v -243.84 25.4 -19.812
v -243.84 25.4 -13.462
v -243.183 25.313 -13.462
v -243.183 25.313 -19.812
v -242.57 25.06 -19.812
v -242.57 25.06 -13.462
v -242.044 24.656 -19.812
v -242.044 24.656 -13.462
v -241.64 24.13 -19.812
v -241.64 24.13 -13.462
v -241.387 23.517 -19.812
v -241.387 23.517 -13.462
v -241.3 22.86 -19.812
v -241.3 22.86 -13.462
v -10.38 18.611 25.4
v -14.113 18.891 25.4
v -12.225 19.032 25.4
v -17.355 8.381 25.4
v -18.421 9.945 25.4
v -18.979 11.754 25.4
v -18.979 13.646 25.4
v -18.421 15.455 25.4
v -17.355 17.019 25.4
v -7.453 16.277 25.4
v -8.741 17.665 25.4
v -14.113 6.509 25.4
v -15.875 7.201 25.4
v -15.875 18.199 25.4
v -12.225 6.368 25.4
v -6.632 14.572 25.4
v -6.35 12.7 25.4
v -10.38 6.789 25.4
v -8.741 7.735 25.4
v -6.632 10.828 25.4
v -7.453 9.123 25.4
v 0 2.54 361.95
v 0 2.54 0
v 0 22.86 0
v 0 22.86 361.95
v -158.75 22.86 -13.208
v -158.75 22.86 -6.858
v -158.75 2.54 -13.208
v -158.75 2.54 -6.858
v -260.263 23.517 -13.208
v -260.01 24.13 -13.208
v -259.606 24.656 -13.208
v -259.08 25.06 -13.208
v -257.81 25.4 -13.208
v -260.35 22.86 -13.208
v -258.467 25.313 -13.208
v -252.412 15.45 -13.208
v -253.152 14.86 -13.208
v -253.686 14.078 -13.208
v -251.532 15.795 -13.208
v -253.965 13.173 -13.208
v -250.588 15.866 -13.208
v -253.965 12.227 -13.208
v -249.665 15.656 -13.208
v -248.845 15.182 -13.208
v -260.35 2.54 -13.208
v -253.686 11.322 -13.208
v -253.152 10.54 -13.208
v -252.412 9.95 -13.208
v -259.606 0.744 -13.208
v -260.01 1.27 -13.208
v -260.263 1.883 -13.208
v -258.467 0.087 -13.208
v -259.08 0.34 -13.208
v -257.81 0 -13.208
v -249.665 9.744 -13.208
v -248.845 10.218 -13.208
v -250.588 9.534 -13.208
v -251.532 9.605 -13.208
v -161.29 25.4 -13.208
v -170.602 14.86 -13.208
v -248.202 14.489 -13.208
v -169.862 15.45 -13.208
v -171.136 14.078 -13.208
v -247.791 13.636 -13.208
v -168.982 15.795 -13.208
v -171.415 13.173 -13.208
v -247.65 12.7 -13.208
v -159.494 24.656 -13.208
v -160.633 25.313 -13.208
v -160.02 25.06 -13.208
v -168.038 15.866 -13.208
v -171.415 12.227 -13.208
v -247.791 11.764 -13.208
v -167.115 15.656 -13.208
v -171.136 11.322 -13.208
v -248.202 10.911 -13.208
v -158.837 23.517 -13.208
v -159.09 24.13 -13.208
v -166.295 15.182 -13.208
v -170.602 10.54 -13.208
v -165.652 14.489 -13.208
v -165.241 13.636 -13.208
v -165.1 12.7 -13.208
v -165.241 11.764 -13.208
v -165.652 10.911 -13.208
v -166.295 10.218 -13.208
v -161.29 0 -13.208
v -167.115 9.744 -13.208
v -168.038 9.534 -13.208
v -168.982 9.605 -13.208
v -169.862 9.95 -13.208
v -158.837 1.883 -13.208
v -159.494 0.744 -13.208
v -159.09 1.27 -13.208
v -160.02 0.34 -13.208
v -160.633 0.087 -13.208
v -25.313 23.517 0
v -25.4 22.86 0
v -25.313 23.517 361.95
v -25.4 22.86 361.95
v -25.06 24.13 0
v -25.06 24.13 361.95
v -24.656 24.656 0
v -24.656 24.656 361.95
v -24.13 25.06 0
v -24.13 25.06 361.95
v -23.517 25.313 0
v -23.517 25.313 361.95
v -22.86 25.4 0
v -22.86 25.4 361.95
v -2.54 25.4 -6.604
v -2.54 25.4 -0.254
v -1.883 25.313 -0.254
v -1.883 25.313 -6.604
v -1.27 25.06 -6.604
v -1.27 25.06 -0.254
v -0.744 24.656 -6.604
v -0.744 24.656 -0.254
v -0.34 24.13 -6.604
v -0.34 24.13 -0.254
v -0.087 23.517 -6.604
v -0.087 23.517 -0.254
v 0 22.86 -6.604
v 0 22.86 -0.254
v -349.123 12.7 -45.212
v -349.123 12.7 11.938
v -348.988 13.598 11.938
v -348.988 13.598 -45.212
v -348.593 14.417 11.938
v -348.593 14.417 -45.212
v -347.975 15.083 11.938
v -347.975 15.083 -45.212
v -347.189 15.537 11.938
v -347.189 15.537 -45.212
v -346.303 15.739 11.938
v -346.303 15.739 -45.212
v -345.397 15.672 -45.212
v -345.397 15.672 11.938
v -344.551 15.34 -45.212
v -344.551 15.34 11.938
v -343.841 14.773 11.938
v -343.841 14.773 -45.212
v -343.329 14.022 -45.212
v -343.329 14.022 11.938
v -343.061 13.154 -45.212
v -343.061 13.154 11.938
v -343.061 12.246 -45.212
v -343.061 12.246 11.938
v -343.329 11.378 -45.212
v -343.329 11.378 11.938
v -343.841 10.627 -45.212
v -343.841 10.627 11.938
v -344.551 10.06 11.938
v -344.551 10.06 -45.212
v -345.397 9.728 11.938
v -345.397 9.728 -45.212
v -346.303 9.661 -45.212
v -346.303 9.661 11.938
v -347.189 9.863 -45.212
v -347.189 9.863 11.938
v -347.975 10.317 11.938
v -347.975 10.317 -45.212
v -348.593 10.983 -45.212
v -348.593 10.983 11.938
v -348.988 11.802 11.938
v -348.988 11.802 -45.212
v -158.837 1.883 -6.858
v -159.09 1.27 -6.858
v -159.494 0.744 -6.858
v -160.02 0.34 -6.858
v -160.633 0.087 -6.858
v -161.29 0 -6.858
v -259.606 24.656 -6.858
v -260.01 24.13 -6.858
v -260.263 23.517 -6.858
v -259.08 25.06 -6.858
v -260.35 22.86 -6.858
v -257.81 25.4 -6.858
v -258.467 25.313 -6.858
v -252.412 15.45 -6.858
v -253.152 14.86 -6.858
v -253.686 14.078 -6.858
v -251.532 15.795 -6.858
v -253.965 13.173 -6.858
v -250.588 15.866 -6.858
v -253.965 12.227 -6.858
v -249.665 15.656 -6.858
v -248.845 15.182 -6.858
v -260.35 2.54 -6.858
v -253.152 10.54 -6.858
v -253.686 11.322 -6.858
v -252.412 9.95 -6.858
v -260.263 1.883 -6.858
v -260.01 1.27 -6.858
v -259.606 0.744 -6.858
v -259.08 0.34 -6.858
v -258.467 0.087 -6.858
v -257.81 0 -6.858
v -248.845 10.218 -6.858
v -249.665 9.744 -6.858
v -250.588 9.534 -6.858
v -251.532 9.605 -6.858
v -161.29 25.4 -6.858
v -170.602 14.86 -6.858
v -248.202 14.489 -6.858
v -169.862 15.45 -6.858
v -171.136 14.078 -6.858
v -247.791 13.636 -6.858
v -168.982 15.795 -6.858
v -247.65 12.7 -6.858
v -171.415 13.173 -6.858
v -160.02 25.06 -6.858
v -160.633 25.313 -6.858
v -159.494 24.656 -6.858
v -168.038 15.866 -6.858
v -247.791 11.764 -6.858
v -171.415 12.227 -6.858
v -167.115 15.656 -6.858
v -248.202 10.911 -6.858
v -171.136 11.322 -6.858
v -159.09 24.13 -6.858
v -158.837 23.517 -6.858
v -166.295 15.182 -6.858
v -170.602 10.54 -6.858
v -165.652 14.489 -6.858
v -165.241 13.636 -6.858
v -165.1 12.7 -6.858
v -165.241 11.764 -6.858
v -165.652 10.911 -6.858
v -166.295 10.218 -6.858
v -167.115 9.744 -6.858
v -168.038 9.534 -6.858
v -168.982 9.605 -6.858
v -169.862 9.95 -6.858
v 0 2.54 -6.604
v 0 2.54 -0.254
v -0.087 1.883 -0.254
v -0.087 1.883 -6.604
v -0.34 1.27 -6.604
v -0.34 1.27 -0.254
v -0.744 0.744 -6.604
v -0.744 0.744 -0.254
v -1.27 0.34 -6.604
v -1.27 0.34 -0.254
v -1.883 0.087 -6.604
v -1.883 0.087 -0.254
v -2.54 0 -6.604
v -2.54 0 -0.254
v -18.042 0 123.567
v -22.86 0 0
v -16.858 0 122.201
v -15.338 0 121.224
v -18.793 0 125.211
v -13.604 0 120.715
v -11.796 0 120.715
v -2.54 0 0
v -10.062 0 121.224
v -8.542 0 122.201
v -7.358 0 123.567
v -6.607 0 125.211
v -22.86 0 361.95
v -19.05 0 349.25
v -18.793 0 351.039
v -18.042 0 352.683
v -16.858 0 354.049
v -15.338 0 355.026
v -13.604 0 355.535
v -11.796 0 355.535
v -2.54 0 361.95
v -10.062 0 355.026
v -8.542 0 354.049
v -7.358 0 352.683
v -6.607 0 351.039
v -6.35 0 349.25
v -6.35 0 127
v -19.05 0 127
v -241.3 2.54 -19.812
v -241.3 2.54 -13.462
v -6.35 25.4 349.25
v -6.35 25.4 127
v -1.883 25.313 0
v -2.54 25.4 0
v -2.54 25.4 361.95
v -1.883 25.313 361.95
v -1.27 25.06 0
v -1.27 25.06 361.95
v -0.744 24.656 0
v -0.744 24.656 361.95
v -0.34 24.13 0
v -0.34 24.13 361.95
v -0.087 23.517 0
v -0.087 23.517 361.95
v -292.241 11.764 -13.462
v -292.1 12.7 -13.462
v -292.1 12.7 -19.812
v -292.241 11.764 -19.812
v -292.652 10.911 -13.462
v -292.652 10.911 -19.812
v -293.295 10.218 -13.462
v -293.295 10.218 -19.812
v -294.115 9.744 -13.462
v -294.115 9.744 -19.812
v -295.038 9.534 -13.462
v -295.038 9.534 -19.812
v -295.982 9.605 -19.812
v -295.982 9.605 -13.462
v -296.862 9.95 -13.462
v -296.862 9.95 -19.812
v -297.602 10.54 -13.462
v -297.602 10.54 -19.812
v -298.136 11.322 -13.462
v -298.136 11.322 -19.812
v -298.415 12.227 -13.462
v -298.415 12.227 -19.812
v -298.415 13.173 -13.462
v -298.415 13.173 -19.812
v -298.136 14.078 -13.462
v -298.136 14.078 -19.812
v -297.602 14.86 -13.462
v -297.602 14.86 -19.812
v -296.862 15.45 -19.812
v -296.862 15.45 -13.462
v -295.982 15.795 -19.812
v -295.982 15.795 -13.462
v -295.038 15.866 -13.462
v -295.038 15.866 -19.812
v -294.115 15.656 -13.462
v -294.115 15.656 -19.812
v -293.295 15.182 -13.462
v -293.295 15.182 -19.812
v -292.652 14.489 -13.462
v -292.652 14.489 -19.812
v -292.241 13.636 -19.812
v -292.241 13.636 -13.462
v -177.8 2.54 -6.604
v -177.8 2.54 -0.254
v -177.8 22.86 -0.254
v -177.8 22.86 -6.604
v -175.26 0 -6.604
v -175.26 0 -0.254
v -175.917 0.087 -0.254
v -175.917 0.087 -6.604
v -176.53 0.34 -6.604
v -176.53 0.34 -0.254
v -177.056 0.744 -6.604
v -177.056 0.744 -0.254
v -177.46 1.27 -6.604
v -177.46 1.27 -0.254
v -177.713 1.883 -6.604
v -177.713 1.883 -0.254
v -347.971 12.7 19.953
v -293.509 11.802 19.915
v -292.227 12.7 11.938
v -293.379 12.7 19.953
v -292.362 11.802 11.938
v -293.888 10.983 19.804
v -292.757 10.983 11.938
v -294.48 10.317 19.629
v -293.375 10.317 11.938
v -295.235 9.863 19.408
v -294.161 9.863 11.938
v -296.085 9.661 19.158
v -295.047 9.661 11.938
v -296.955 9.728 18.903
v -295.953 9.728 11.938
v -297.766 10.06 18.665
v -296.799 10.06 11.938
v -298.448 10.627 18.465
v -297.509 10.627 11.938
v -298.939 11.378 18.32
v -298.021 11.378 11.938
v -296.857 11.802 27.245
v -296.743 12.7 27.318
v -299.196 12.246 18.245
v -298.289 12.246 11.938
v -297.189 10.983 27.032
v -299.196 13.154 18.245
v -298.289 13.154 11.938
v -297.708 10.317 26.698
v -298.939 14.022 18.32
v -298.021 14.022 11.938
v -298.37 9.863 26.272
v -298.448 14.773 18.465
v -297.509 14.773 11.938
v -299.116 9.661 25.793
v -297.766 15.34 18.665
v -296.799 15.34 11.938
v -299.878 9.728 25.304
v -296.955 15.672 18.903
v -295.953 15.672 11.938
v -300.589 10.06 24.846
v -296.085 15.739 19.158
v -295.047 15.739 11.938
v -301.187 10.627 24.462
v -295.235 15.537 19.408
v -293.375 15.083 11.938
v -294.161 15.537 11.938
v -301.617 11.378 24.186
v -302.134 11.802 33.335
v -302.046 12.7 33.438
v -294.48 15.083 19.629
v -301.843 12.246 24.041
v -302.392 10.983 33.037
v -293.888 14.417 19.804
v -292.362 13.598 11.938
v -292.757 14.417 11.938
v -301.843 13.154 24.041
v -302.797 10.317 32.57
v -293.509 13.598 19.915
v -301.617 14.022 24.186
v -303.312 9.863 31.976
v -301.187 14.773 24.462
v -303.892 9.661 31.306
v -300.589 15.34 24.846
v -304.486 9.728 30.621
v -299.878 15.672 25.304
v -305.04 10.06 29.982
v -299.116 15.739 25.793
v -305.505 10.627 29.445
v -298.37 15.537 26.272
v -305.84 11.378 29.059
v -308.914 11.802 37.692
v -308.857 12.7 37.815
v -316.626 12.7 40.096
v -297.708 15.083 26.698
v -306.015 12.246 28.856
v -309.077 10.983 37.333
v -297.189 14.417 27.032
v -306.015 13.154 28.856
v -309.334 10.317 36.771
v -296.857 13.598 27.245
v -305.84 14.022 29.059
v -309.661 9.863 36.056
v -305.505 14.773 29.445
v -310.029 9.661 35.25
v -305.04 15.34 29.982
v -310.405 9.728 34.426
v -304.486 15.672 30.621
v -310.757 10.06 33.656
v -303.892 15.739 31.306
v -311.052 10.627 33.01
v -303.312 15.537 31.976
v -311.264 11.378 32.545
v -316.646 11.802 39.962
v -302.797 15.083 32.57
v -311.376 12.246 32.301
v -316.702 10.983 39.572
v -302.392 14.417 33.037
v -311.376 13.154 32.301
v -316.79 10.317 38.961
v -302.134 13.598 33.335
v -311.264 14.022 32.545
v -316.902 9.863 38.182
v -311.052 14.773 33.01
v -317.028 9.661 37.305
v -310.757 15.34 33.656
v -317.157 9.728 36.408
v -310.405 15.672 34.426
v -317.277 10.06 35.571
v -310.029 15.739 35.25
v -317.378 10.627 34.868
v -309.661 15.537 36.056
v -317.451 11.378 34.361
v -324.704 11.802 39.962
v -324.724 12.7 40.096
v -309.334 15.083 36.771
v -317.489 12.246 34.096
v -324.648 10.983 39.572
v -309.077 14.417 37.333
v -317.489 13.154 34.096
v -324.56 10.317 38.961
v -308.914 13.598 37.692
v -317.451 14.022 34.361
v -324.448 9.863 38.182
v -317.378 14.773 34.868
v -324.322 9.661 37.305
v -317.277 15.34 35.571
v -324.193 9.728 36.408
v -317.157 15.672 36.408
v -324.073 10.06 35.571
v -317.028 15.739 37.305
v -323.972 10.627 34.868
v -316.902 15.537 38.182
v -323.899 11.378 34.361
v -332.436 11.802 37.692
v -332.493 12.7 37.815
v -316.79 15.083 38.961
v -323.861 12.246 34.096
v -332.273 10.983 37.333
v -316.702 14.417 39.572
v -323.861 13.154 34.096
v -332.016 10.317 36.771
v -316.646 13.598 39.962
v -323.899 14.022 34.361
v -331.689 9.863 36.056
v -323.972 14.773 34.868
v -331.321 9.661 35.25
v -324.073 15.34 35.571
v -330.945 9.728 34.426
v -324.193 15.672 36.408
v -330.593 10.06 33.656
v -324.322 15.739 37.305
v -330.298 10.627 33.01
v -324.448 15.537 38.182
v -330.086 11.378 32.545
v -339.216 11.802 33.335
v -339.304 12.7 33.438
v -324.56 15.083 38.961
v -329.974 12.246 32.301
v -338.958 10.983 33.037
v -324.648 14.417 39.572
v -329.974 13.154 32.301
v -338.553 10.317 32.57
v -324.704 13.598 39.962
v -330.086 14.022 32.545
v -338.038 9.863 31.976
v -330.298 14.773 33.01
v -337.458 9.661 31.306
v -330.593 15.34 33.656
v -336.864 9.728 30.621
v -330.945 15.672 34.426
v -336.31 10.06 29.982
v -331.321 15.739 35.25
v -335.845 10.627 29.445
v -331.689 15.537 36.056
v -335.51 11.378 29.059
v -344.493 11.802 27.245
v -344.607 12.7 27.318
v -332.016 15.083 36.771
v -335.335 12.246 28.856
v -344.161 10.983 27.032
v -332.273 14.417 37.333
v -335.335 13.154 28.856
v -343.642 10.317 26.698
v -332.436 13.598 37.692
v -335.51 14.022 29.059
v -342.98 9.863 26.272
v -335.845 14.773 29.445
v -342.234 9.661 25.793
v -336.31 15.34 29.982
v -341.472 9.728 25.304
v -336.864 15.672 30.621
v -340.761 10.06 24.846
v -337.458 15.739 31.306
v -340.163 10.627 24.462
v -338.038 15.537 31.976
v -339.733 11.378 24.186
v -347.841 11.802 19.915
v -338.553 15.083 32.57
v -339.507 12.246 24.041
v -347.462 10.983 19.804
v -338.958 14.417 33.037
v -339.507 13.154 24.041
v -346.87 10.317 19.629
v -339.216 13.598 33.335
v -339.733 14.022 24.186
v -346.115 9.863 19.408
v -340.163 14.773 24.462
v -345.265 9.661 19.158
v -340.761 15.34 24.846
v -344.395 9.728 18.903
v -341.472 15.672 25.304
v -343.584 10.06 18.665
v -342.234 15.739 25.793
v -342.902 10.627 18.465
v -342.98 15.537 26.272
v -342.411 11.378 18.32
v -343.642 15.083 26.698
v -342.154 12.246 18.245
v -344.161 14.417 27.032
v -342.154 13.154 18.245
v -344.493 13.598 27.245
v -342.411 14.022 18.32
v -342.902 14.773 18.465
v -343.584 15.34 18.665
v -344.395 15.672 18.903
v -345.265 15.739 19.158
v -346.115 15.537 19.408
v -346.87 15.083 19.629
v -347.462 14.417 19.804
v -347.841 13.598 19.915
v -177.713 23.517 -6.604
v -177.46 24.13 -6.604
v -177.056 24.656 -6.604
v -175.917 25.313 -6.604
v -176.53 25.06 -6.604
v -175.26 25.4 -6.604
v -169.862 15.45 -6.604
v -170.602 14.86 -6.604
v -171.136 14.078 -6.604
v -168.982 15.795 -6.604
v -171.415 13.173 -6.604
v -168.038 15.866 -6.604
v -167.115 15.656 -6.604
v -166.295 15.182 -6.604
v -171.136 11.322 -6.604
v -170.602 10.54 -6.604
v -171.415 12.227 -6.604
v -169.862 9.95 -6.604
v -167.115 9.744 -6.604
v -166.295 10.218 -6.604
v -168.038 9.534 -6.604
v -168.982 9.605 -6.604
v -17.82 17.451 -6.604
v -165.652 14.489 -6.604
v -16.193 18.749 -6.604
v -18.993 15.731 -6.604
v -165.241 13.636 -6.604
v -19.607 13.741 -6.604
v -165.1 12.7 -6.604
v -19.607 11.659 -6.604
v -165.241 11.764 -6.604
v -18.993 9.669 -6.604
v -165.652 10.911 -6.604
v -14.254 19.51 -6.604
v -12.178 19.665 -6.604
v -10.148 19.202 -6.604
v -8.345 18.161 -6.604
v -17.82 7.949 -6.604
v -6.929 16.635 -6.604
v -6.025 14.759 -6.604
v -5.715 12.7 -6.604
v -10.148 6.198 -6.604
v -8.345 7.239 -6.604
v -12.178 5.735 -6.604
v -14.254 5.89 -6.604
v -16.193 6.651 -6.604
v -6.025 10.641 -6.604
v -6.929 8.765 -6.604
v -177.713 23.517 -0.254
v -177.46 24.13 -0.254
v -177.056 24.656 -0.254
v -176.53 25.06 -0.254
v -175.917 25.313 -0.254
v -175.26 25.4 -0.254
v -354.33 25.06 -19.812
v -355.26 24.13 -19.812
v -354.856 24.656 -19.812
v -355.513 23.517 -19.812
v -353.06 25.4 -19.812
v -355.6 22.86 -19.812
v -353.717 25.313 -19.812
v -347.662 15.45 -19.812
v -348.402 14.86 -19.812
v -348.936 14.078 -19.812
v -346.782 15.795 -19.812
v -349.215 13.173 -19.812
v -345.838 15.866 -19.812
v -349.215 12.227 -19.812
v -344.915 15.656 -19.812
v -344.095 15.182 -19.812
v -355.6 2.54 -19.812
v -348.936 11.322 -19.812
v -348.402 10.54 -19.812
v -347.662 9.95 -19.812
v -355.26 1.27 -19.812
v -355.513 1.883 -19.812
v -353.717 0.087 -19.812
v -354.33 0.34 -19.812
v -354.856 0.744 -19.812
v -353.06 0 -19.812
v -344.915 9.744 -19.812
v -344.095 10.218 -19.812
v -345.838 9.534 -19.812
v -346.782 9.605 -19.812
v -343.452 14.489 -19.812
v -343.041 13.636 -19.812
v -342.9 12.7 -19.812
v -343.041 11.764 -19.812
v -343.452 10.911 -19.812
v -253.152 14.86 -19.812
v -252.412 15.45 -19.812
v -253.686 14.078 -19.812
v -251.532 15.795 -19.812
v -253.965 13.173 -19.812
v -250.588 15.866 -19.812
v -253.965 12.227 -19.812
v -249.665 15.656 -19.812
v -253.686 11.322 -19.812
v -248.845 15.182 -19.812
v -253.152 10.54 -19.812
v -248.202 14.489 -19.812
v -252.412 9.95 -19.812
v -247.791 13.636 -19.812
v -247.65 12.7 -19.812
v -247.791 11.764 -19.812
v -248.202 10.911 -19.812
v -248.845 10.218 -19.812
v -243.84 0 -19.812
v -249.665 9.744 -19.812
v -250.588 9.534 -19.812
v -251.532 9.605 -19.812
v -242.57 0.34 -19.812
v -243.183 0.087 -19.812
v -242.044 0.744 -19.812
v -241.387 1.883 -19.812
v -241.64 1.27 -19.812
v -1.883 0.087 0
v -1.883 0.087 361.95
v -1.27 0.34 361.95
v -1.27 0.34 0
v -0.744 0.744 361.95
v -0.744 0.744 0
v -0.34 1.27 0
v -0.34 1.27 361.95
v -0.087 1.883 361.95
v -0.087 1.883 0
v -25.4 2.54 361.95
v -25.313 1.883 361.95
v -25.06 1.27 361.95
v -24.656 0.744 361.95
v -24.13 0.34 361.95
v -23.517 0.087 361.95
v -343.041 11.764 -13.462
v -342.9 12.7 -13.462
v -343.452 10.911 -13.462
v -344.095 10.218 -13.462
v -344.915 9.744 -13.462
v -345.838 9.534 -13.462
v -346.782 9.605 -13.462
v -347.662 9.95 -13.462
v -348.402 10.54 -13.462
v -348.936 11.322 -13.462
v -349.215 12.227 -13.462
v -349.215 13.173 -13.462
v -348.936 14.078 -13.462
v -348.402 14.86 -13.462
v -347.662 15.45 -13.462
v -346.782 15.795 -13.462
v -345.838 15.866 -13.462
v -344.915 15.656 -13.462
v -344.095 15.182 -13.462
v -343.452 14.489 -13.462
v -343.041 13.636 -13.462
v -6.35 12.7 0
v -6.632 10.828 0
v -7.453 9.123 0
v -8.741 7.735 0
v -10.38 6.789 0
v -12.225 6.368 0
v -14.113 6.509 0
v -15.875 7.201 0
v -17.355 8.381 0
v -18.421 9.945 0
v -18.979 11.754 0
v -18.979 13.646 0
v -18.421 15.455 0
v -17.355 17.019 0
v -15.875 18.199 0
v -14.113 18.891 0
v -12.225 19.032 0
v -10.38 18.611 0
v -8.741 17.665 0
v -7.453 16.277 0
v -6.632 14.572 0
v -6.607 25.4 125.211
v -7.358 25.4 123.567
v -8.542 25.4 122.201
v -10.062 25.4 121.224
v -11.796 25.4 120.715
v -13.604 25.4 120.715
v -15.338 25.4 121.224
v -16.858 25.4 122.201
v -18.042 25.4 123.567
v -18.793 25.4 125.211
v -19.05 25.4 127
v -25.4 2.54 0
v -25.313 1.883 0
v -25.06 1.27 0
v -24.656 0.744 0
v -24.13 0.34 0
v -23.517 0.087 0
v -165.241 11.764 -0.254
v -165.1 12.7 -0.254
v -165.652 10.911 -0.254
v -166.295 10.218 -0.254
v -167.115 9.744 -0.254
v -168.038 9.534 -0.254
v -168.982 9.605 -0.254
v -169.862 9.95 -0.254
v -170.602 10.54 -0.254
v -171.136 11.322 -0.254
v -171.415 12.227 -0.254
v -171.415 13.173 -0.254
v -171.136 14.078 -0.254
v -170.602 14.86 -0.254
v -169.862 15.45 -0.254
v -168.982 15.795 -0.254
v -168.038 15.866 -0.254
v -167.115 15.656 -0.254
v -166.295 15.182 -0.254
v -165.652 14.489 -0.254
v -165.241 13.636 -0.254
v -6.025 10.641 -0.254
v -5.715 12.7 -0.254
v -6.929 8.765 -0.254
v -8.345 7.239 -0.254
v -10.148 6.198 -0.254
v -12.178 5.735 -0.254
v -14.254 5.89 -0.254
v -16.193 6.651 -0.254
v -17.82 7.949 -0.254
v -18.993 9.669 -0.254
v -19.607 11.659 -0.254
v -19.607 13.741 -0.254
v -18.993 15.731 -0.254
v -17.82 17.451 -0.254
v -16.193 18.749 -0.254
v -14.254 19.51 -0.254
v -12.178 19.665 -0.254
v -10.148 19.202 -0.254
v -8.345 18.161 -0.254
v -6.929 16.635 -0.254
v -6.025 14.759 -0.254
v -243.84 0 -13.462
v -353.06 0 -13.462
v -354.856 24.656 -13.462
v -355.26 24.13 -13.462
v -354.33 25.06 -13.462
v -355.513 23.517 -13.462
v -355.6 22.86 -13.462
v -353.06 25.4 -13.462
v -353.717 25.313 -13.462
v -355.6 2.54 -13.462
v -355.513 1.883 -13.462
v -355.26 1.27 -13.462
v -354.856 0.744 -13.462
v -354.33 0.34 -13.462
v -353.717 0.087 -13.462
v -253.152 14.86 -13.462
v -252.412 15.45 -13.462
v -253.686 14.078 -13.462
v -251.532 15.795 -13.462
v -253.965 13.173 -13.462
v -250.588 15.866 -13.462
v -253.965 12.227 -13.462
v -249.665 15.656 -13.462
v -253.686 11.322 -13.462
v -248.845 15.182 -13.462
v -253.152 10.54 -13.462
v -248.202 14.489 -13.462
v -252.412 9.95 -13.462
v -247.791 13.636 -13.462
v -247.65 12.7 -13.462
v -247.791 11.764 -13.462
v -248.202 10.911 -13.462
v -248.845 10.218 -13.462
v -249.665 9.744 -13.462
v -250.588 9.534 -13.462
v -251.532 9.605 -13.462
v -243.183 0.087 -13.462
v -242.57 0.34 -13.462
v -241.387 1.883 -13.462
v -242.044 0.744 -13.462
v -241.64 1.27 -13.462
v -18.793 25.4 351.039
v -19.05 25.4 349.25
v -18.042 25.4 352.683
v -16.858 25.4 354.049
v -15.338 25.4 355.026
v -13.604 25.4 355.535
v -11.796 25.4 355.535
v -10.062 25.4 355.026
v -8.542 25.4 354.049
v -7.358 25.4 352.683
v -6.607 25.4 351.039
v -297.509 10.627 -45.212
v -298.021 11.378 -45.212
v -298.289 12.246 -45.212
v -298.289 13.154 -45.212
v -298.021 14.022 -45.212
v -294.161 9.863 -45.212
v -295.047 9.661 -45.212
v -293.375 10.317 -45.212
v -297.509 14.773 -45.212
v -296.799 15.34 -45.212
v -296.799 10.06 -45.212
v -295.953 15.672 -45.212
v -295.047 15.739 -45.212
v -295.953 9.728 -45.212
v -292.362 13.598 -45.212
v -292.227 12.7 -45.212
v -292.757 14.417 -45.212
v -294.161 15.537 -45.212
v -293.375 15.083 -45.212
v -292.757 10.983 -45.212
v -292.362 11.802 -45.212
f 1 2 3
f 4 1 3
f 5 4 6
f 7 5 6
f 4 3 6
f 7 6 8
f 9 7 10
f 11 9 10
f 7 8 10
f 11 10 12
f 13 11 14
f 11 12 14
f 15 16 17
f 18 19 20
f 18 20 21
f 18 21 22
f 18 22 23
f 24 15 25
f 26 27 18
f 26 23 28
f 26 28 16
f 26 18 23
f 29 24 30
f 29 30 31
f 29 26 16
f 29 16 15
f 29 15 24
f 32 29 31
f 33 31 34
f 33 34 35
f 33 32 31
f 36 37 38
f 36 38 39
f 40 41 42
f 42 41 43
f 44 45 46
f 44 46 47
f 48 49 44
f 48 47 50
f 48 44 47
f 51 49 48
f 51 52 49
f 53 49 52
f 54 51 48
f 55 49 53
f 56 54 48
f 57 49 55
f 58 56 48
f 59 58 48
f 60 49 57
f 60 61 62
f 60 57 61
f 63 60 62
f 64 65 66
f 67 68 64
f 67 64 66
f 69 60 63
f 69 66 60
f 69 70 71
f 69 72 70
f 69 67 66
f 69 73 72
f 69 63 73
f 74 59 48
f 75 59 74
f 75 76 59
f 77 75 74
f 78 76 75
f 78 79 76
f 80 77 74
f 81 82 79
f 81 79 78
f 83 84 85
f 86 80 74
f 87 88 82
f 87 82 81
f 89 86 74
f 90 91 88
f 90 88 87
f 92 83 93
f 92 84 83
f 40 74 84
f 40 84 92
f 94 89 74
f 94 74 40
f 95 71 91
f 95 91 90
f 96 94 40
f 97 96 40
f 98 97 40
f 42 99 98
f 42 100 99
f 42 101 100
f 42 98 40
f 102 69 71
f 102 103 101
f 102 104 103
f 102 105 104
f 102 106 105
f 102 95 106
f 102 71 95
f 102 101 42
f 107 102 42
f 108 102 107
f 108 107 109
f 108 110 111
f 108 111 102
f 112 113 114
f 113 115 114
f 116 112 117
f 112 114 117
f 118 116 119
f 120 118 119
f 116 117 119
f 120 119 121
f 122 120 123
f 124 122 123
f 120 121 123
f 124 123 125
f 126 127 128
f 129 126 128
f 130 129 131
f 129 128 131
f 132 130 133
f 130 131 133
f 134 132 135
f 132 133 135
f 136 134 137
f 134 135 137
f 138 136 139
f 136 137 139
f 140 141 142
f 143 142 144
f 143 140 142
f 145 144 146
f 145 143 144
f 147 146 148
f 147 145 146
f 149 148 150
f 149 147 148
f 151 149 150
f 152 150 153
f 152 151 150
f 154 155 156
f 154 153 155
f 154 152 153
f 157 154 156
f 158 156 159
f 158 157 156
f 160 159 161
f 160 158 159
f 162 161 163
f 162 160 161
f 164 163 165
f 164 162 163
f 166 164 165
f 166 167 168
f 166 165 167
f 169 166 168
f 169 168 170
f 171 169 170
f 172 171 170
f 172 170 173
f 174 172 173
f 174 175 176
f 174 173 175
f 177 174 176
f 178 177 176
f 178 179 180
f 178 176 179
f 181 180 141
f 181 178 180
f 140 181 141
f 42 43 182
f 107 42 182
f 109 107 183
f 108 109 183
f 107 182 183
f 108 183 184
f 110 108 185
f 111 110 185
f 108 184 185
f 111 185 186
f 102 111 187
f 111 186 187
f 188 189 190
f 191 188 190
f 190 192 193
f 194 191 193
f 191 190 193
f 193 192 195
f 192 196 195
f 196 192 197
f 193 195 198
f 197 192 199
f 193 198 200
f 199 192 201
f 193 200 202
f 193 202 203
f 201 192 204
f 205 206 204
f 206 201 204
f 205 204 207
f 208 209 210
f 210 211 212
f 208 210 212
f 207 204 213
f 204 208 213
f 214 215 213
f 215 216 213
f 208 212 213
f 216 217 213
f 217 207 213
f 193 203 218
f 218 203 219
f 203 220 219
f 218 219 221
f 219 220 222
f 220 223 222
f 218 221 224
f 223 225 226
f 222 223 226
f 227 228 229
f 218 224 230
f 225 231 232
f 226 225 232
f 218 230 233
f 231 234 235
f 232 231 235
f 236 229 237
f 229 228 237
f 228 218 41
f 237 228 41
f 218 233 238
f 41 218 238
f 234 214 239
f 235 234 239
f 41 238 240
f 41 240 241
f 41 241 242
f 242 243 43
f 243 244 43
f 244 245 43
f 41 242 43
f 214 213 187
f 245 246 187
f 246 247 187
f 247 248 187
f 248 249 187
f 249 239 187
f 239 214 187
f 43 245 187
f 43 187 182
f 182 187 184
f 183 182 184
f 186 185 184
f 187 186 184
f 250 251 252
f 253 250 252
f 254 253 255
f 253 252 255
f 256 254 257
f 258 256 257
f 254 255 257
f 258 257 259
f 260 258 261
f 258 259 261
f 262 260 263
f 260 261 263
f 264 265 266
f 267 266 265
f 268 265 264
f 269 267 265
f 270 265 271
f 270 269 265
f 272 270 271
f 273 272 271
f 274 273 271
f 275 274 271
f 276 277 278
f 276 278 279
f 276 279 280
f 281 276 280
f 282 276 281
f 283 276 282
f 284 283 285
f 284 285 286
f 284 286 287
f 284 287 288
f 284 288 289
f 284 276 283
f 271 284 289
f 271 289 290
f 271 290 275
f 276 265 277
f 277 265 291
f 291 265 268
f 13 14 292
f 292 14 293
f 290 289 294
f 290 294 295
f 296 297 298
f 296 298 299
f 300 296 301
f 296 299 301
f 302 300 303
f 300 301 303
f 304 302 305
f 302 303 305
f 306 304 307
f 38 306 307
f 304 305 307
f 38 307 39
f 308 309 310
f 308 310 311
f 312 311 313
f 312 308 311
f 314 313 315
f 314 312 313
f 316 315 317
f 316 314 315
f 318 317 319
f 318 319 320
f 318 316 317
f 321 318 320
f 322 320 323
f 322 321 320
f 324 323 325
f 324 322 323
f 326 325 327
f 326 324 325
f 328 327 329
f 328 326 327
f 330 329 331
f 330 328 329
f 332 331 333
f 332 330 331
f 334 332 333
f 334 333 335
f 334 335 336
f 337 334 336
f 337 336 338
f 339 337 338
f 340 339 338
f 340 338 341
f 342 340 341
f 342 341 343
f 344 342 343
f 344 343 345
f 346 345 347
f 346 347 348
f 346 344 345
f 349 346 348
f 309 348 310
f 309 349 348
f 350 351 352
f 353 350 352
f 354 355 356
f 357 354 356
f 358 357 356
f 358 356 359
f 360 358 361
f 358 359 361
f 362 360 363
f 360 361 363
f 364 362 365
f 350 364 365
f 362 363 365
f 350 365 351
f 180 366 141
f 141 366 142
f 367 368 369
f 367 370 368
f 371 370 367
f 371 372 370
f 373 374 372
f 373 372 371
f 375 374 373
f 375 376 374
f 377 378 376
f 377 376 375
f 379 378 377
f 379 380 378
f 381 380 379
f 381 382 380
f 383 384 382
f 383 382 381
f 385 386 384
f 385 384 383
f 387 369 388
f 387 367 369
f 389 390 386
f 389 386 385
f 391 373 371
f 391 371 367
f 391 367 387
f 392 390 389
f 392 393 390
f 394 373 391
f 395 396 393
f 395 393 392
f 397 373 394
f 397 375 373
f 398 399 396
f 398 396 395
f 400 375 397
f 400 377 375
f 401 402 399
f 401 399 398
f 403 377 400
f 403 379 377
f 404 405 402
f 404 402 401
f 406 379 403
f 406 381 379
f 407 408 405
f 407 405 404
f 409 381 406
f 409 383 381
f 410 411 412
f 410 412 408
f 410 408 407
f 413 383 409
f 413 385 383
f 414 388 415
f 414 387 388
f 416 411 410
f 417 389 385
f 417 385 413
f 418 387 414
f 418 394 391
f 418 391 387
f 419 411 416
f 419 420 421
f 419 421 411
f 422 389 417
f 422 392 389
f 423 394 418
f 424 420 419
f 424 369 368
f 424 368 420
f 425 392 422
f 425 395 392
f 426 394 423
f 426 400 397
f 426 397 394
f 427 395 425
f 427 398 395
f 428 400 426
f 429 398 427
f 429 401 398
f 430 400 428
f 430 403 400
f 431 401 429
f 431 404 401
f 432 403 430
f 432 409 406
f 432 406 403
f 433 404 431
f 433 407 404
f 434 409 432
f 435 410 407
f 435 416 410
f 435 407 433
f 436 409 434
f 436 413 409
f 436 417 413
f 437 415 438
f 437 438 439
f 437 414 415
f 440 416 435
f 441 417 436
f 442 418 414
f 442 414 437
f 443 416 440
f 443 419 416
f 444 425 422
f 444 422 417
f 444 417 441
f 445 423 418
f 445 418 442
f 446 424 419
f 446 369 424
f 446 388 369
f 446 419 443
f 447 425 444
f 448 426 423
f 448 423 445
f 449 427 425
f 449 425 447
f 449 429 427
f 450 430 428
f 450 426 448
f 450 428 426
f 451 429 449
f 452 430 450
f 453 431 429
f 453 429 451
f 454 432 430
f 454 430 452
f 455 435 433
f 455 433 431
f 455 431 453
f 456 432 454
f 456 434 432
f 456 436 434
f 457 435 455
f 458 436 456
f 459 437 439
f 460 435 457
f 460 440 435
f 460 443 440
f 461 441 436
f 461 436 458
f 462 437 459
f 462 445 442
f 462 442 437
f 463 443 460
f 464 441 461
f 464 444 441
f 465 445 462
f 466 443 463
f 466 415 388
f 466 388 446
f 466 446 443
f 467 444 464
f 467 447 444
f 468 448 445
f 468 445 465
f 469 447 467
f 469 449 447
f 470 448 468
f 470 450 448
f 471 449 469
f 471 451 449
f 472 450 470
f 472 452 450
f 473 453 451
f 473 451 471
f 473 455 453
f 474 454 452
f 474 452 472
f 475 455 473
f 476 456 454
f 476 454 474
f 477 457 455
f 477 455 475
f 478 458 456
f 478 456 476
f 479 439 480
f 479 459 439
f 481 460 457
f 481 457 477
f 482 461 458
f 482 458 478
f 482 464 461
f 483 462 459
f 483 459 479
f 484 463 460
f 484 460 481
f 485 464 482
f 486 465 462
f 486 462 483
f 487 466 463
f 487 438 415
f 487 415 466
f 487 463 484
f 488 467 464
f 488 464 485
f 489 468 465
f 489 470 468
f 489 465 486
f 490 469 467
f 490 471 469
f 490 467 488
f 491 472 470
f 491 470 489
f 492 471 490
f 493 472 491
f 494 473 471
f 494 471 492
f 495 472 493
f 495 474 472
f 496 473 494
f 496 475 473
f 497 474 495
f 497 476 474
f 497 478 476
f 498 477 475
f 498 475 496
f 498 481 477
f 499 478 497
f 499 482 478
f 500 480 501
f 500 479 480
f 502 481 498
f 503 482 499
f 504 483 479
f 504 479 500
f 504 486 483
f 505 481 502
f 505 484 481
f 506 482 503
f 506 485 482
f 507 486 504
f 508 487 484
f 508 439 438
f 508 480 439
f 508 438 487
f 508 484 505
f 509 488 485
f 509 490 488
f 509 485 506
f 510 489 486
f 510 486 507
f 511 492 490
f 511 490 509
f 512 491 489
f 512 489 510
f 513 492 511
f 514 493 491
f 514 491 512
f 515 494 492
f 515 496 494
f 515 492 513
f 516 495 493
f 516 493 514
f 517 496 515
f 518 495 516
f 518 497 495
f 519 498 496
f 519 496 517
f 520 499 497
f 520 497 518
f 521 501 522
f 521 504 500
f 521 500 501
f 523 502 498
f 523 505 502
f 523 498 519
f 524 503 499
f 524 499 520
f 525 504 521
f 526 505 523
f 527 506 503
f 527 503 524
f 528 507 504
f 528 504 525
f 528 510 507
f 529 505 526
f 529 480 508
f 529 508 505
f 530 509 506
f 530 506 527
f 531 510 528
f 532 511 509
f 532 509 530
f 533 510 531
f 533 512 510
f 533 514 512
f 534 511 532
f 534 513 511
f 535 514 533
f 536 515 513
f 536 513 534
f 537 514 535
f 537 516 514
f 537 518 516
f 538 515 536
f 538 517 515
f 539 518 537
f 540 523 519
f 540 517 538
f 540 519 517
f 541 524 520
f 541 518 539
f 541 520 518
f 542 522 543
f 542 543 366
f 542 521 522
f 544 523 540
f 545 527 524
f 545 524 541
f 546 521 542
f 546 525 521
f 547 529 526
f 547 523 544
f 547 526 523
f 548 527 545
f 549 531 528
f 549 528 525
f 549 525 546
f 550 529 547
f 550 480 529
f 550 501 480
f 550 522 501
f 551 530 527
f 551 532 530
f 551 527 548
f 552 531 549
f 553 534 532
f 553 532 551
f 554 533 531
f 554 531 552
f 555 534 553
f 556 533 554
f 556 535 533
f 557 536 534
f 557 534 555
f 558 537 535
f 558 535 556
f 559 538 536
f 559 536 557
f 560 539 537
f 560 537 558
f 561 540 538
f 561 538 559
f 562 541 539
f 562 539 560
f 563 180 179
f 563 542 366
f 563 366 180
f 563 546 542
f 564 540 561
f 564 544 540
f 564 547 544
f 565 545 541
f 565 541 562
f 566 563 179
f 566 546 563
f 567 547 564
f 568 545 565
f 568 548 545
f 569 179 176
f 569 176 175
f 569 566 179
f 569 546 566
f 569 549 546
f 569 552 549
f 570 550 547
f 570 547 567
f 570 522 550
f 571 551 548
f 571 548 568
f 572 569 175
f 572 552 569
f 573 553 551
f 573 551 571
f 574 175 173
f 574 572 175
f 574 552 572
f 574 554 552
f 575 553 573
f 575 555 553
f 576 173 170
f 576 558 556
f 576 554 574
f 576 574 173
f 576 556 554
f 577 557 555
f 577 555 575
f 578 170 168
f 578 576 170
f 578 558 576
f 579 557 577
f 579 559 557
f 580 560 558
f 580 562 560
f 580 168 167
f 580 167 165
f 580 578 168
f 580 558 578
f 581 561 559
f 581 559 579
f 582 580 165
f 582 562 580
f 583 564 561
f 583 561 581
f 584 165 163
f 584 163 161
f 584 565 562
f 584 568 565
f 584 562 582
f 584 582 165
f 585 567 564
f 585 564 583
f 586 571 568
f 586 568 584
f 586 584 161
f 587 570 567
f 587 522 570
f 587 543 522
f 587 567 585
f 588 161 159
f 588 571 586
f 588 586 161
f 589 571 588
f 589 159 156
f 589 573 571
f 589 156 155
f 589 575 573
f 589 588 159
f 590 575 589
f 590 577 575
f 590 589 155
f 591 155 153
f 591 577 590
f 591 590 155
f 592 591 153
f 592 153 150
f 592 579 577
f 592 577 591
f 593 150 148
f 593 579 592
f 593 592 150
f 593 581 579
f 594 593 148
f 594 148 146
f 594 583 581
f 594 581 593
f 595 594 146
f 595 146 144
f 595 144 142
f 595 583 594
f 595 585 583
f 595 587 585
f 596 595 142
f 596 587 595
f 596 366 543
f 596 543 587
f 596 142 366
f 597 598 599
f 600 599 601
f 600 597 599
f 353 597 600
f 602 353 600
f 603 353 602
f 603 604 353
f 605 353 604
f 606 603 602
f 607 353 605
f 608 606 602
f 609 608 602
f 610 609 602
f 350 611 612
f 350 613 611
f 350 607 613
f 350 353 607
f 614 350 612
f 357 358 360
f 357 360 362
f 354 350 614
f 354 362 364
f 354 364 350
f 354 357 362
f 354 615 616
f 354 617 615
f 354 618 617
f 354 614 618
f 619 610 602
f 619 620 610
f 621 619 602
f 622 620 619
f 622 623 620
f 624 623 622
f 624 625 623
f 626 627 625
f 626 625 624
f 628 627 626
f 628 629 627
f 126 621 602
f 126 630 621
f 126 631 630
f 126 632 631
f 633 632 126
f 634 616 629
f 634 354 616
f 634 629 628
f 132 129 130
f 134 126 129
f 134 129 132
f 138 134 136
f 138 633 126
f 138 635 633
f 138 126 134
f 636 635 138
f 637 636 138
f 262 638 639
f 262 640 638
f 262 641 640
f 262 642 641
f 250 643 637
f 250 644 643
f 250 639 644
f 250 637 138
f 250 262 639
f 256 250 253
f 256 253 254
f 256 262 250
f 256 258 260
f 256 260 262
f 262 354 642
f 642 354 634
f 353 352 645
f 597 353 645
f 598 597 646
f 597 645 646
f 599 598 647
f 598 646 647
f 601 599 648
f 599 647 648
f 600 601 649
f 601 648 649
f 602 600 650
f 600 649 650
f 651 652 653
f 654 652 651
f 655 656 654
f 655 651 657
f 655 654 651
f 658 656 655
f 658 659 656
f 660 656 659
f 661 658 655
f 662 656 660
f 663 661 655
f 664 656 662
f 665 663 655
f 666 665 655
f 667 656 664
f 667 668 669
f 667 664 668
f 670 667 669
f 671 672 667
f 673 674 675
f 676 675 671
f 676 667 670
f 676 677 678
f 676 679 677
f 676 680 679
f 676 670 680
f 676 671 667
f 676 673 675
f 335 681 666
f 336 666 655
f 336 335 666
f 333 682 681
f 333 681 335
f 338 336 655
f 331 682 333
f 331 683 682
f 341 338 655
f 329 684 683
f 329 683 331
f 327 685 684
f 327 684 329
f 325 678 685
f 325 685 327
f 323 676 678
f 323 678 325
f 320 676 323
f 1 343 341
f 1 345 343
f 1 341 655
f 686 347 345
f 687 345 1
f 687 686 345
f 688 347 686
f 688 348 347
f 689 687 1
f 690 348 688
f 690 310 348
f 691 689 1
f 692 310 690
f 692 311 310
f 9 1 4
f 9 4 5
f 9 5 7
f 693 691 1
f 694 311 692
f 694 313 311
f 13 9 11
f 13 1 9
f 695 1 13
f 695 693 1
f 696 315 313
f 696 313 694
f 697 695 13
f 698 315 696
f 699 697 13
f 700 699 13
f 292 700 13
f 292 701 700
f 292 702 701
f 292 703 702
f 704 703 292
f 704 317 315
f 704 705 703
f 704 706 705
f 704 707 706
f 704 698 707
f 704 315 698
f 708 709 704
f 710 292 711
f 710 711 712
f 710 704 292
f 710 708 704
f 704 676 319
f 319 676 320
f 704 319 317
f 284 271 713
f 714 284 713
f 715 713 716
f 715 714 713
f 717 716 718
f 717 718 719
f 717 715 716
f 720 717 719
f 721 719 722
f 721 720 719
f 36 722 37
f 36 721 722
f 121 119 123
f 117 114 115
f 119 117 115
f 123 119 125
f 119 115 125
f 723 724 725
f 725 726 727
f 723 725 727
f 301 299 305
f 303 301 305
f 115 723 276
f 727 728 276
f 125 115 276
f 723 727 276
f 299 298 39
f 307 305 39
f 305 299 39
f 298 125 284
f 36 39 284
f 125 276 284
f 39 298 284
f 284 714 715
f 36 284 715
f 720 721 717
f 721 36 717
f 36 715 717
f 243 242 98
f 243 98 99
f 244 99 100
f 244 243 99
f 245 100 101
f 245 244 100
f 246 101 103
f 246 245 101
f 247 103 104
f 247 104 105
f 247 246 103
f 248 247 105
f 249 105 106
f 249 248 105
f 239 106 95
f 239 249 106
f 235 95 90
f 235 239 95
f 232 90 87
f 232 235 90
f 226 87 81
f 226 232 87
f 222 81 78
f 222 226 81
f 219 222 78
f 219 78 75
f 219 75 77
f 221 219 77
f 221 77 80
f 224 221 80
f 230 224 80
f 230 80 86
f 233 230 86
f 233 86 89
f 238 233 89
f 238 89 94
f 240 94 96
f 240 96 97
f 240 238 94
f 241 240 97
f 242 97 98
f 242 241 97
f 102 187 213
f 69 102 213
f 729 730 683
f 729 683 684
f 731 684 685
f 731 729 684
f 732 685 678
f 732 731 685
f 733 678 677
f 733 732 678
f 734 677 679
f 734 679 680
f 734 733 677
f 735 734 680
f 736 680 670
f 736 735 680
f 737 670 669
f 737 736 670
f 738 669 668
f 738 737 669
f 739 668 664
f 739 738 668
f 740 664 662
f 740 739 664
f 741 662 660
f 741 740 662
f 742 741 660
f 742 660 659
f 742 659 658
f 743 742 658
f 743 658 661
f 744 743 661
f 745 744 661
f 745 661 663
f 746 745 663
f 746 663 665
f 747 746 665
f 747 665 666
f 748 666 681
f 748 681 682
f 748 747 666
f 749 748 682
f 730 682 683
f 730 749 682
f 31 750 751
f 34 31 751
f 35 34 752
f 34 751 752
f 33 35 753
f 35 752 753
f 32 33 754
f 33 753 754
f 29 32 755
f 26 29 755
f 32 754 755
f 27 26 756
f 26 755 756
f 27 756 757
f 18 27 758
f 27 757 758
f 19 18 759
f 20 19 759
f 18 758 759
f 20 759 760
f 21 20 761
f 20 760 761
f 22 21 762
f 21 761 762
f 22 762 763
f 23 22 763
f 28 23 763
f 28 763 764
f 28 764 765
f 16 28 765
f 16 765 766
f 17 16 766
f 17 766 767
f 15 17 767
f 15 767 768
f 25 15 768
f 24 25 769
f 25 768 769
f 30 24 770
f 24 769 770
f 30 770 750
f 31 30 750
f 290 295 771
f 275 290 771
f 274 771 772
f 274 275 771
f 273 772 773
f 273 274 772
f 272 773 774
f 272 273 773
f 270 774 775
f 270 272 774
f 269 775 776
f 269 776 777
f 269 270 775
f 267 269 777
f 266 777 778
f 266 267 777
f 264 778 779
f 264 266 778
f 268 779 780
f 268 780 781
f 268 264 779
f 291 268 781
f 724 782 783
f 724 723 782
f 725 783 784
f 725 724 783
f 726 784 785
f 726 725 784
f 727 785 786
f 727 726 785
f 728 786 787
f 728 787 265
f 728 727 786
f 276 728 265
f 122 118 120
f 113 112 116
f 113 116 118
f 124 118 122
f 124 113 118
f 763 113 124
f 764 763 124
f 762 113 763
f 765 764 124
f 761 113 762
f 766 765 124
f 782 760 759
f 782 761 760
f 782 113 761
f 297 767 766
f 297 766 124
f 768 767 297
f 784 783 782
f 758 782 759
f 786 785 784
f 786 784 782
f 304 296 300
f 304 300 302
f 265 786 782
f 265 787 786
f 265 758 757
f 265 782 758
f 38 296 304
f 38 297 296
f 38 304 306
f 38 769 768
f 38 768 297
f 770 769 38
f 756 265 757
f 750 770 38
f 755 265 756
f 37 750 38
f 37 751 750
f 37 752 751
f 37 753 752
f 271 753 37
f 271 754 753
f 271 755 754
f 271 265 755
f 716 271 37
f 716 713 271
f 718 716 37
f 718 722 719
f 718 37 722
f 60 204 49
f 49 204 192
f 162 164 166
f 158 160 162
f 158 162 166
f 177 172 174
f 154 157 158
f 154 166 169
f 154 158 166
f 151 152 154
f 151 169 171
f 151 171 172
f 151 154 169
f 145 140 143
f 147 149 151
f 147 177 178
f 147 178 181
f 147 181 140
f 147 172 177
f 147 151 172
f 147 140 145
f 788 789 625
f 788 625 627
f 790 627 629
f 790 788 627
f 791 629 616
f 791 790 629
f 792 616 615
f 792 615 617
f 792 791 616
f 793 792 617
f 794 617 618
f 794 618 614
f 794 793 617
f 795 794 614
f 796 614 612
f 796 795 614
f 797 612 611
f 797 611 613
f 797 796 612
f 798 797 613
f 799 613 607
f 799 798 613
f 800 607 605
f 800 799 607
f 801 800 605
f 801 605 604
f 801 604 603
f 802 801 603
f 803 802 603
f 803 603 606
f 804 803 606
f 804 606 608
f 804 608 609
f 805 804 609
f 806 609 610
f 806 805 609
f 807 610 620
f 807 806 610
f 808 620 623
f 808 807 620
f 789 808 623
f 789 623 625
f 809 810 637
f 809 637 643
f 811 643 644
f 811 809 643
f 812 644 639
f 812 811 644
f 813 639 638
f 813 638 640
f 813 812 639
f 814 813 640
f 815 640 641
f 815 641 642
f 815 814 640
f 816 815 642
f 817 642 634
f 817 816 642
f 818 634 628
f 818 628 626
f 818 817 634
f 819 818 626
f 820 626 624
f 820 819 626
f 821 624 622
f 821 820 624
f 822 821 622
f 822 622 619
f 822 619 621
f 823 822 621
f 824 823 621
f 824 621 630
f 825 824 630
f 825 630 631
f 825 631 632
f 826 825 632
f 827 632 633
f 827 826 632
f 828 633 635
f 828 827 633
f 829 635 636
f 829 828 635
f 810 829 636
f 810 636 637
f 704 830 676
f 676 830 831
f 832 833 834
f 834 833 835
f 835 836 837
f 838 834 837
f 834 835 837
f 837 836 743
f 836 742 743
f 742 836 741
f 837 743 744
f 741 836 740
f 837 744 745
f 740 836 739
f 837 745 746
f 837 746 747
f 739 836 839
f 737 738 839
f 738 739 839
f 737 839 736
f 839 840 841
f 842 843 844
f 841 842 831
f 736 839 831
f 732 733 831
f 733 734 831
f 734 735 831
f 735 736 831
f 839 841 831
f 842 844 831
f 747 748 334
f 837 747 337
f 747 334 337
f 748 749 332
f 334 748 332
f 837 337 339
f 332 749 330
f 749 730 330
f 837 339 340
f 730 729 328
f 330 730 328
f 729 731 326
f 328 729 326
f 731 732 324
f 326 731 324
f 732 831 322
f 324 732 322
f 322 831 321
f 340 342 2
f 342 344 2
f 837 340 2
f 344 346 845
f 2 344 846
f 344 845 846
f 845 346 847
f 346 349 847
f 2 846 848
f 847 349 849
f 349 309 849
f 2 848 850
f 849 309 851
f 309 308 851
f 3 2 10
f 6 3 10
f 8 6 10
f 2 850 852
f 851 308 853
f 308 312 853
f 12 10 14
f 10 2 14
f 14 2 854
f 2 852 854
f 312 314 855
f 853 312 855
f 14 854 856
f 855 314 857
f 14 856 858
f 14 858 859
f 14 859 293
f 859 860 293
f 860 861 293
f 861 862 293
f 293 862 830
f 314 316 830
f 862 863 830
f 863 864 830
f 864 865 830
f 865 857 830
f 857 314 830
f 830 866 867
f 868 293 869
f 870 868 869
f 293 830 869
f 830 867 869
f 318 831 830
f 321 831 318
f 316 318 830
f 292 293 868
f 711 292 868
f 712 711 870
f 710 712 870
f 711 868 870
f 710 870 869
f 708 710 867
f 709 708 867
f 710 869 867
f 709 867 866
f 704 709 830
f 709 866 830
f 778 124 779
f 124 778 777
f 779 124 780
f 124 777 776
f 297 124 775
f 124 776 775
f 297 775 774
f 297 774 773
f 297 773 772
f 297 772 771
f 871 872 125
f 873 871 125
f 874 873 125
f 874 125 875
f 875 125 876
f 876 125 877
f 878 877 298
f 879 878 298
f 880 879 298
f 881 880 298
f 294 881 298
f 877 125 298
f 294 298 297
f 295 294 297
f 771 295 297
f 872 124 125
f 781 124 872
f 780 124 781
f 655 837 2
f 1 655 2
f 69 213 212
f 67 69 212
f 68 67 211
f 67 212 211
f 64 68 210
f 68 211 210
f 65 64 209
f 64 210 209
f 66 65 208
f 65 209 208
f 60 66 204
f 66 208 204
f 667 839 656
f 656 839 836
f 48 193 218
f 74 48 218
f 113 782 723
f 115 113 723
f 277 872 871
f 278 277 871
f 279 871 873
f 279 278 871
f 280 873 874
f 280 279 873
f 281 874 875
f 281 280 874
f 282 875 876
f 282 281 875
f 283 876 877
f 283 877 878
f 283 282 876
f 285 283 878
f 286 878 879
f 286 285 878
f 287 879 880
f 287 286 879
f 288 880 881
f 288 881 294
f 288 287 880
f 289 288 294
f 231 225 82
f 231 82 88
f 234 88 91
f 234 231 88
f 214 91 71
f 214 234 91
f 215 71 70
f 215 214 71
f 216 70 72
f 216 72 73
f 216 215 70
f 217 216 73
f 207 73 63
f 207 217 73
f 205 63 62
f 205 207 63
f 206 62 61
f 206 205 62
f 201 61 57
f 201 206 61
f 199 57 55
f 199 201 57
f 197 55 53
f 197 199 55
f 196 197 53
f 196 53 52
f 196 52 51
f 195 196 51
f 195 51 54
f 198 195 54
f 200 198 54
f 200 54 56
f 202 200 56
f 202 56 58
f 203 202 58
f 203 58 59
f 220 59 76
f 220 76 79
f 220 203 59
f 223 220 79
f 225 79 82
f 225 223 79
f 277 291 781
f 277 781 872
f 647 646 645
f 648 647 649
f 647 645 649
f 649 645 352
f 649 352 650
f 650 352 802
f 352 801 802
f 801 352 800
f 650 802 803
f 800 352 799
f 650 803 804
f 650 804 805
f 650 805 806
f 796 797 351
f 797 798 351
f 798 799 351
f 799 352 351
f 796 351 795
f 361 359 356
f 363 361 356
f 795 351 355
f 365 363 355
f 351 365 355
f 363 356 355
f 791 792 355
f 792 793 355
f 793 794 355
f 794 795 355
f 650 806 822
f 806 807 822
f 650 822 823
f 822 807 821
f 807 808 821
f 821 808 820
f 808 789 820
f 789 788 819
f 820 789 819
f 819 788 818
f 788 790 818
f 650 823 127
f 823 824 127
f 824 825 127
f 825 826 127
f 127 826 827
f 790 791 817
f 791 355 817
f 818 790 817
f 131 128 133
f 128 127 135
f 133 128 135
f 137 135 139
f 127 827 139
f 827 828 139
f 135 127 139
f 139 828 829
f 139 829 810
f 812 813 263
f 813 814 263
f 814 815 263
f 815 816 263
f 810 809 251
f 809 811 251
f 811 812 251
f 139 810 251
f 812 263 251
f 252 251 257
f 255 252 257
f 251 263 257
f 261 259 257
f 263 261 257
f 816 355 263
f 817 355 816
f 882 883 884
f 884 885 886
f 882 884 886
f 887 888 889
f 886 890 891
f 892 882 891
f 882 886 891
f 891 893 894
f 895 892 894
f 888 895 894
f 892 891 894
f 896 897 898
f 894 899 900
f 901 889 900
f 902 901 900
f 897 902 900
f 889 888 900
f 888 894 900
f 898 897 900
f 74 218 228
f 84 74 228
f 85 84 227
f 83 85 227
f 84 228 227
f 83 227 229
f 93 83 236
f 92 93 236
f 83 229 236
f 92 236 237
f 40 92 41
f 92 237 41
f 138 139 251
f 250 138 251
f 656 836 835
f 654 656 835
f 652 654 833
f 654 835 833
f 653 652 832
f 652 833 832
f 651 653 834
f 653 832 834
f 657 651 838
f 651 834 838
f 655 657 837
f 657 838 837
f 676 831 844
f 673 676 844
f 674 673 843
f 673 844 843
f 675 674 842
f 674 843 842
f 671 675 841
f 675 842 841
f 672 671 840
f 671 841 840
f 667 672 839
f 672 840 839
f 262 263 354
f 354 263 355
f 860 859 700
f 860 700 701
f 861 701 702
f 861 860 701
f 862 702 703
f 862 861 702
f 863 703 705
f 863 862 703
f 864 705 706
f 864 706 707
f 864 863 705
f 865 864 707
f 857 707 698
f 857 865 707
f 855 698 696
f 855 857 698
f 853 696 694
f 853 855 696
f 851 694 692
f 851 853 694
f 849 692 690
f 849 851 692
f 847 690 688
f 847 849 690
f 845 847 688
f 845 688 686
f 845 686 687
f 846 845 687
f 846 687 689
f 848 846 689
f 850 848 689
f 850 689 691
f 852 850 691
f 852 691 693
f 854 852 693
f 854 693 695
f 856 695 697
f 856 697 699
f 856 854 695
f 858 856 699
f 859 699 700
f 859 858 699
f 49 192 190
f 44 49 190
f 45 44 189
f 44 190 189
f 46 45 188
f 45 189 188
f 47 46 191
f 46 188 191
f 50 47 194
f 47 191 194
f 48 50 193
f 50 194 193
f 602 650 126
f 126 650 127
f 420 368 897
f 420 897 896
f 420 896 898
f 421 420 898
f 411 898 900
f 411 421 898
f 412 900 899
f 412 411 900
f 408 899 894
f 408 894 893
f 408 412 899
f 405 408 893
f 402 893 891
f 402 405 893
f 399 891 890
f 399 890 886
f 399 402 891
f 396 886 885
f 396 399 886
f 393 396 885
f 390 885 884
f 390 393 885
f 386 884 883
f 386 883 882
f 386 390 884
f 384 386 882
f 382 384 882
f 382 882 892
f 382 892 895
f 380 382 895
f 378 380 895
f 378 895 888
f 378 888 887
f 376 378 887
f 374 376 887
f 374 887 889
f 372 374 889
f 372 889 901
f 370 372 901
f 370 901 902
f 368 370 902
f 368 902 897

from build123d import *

# Parameters (mm, degrees)
F0_W      = 25.4
F0_H      = 361.95
F1_DEPTH  = 25.4
F2_R      = 6.35
F3_DEPTH  = 25.4
F5_R      = 3.175
F5_R_2    = 6.985
F6_DEPTH  = 6.35
F7_R      = 2.54
F9_R      = 3.175
F10_DEPTH = 6.35
F12_R     = 3.175
F13_DEPTH = 6.35
F16_R     = 3.048


with BuildPart() as f1:
    # F0 (on Front) → F1 (new body)
    with BuildSketch(Plane.XZ):
        with Locations((-12.7, 180.975)):
            Rectangle(F0_W, F0_H)
        with BuildLine():
            ThreePointArc((-19.05, 349.25), (-12.7, 355.6), (-6.35, 349.25))
            Line((-6.35, 349.25), (-6.35, 127))
            ThreePointArc((-6.35, 127), (-12.7, 120.65), (-19.05, 127))
            Line((-19.05, 127), (-19.05, 349.25))
        make_face(mode=Mode.SUBTRACT)
    extrude(amount=-F1_DEPTH)

    # F2 (on face) → F3 (cut)
    with BuildSketch(Plane(origin=(0, 0, 0), x_dir=(1, 0, 0), z_dir=(0, 0, -1))):
        with Locations((-12.7, -12.7)):
            Circle(F2_R)
    extrude(amount=-F3_DEPTH, mode=Mode.SUBTRACT)

    # F7
    f7_edges = [f1.edges().sort_by_distance(p)[0] for p in [
        (-25.4, 0, 180.975),
        (-25.4, 25.4, 180.975),
        (0, 0, 180.975),
        (0, 25.4, 180.975),
    ]]
    fillet(f7_edges, radius=F7_R)


with BuildPart() as f6:
    # F5 (on offset) → F6 (new body)
    with BuildSketch(Plane(origin=(0, 0, -0.254), x_dir=(1, 0, 0), z_dir=(0, 0, -1))):
        with BuildLine():
            ThreePointArc((0, -2.54), (-0.7439487758, -0.7439487758), (-2.54, 0))
            Line((-2.54, 0), (-175.26, 0))
            ThreePointArc((-175.26, 0), (-177.0560512242, -0.7439487758), (-177.8, -2.54))
            Line((-177.8, -2.54), (-177.8, -22.86))
            ThreePointArc((-177.8, -22.86), (-177.0560512242, -24.6560512242), (-175.26, -25.4))
            Line((-175.26, -25.4), (-2.54, -25.4))
            ThreePointArc((-2.54, -25.4), (-0.7439487758, -24.6560512242), (0, -22.86))
            Line((0, -22.86), (0, -2.54))
        make_face()
        with Locations((-168.275, -12.7)):
            Circle(F5_R, mode=Mode.SUBTRACT)
        with Locations((-12.7, -12.7)):
            Circle(F5_R_2, mode=Mode.SUBTRACT)
    extrude(amount=F6_DEPTH)


with BuildPart() as f10:
    # F9 (on offset) → F10 (new body)
    with BuildSketch(Plane(origin=(0, 0, -6.858), x_dir=(1, 0, 0), z_dir=(0, 0, -1))):
        with BuildLine():
            Line((-257.81, -25.4), (-161.29, -25.4))
            ThreePointArc((-161.29, -25.4), (-159.4939487758, -24.6560512242), (-158.75, -22.86))
            Line((-158.75, -22.86), (-158.75, -2.54))
            ThreePointArc((-158.75, -2.54), (-159.4939487758, -0.7439487758), (-161.29, 0))
            Line((-161.29, 0), (-257.81, 0))
            ThreePointArc((-257.81, 0), (-259.6060512242, -0.7439487758), (-260.35, -2.54))
            Line((-260.35, -2.54), (-260.35, -22.86))
            ThreePointArc((-260.35, -22.86), (-259.6060512242, -24.6560512242), (-257.81, -25.4))
        make_face()
        with Locations((-250.825, -12.7)):
            Circle(F9_R, mode=Mode.SUBTRACT)
        with Locations((-168.275, -12.7)):
            Circle(F9_R, mode=Mode.SUBTRACT)
    extrude(amount=F10_DEPTH)


with BuildPart() as f13:
    # F12 (on offset) → F13 (new body)
    with BuildSketch(Plane(origin=(0, 0, -13.462), x_dir=(1, 0, 0), z_dir=(0, 0, -1))):
        with BuildLine():
            Line((-353.06, -25.4), (-243.84, -25.4))
            ThreePointArc((-243.84, -25.4), (-242.0439487758, -24.6560512242), (-241.3, -22.86))
            Line((-241.3, -22.86), (-241.3, -2.54))
            ThreePointArc((-241.3, -2.54), (-242.0439487758, -0.7439487758), (-243.84, 0))
            Line((-243.84, 0), (-353.06, 0))
            ThreePointArc((-353.06, 0), (-354.8560512242, -0.7439487758), (-355.6, -2.54))
            Line((-355.6, -2.54), (-355.6, -22.86))
            ThreePointArc((-355.6, -22.86), (-354.8560512242, -24.6560512242), (-353.06, -25.4))
        make_face()
        with Locations((-346.075, -12.7)):
            Circle(F12_R, mode=Mode.SUBTRACT)
        with Locations((-295.275, -12.7)):
            Circle(F12_R, mode=Mode.SUBTRACT)
        with Locations((-250.825, -12.7)):
            Circle(F12_R, mode=Mode.SUBTRACT)
    extrude(amount=F13_DEPTH)


with BuildPart() as f17:
    # F17: sweep along a path in F15
    with BuildLine(Plane.XZ.offset(-12.7)) as f17_path:
        Line((-295.275, -45.212), (-295.275, 11.938))
        ThreePointArc((-295.275, 11.938), (-320.675, 37.338), (-346.075, 11.938))
        Line((-346.075, 11.938), (-346.075, -45.212))
    # F16 (on face) → F17 (sweep)
    with BuildSketch(Plane.XY.offset(-13.462)):
        with Locations((-295.275, 12.7)):
            Circle(F16_R)
    sweep(path=f17_path.line)


solid = Compound([f1.part, f6.part, f10.part, f13.part, f17.part])
